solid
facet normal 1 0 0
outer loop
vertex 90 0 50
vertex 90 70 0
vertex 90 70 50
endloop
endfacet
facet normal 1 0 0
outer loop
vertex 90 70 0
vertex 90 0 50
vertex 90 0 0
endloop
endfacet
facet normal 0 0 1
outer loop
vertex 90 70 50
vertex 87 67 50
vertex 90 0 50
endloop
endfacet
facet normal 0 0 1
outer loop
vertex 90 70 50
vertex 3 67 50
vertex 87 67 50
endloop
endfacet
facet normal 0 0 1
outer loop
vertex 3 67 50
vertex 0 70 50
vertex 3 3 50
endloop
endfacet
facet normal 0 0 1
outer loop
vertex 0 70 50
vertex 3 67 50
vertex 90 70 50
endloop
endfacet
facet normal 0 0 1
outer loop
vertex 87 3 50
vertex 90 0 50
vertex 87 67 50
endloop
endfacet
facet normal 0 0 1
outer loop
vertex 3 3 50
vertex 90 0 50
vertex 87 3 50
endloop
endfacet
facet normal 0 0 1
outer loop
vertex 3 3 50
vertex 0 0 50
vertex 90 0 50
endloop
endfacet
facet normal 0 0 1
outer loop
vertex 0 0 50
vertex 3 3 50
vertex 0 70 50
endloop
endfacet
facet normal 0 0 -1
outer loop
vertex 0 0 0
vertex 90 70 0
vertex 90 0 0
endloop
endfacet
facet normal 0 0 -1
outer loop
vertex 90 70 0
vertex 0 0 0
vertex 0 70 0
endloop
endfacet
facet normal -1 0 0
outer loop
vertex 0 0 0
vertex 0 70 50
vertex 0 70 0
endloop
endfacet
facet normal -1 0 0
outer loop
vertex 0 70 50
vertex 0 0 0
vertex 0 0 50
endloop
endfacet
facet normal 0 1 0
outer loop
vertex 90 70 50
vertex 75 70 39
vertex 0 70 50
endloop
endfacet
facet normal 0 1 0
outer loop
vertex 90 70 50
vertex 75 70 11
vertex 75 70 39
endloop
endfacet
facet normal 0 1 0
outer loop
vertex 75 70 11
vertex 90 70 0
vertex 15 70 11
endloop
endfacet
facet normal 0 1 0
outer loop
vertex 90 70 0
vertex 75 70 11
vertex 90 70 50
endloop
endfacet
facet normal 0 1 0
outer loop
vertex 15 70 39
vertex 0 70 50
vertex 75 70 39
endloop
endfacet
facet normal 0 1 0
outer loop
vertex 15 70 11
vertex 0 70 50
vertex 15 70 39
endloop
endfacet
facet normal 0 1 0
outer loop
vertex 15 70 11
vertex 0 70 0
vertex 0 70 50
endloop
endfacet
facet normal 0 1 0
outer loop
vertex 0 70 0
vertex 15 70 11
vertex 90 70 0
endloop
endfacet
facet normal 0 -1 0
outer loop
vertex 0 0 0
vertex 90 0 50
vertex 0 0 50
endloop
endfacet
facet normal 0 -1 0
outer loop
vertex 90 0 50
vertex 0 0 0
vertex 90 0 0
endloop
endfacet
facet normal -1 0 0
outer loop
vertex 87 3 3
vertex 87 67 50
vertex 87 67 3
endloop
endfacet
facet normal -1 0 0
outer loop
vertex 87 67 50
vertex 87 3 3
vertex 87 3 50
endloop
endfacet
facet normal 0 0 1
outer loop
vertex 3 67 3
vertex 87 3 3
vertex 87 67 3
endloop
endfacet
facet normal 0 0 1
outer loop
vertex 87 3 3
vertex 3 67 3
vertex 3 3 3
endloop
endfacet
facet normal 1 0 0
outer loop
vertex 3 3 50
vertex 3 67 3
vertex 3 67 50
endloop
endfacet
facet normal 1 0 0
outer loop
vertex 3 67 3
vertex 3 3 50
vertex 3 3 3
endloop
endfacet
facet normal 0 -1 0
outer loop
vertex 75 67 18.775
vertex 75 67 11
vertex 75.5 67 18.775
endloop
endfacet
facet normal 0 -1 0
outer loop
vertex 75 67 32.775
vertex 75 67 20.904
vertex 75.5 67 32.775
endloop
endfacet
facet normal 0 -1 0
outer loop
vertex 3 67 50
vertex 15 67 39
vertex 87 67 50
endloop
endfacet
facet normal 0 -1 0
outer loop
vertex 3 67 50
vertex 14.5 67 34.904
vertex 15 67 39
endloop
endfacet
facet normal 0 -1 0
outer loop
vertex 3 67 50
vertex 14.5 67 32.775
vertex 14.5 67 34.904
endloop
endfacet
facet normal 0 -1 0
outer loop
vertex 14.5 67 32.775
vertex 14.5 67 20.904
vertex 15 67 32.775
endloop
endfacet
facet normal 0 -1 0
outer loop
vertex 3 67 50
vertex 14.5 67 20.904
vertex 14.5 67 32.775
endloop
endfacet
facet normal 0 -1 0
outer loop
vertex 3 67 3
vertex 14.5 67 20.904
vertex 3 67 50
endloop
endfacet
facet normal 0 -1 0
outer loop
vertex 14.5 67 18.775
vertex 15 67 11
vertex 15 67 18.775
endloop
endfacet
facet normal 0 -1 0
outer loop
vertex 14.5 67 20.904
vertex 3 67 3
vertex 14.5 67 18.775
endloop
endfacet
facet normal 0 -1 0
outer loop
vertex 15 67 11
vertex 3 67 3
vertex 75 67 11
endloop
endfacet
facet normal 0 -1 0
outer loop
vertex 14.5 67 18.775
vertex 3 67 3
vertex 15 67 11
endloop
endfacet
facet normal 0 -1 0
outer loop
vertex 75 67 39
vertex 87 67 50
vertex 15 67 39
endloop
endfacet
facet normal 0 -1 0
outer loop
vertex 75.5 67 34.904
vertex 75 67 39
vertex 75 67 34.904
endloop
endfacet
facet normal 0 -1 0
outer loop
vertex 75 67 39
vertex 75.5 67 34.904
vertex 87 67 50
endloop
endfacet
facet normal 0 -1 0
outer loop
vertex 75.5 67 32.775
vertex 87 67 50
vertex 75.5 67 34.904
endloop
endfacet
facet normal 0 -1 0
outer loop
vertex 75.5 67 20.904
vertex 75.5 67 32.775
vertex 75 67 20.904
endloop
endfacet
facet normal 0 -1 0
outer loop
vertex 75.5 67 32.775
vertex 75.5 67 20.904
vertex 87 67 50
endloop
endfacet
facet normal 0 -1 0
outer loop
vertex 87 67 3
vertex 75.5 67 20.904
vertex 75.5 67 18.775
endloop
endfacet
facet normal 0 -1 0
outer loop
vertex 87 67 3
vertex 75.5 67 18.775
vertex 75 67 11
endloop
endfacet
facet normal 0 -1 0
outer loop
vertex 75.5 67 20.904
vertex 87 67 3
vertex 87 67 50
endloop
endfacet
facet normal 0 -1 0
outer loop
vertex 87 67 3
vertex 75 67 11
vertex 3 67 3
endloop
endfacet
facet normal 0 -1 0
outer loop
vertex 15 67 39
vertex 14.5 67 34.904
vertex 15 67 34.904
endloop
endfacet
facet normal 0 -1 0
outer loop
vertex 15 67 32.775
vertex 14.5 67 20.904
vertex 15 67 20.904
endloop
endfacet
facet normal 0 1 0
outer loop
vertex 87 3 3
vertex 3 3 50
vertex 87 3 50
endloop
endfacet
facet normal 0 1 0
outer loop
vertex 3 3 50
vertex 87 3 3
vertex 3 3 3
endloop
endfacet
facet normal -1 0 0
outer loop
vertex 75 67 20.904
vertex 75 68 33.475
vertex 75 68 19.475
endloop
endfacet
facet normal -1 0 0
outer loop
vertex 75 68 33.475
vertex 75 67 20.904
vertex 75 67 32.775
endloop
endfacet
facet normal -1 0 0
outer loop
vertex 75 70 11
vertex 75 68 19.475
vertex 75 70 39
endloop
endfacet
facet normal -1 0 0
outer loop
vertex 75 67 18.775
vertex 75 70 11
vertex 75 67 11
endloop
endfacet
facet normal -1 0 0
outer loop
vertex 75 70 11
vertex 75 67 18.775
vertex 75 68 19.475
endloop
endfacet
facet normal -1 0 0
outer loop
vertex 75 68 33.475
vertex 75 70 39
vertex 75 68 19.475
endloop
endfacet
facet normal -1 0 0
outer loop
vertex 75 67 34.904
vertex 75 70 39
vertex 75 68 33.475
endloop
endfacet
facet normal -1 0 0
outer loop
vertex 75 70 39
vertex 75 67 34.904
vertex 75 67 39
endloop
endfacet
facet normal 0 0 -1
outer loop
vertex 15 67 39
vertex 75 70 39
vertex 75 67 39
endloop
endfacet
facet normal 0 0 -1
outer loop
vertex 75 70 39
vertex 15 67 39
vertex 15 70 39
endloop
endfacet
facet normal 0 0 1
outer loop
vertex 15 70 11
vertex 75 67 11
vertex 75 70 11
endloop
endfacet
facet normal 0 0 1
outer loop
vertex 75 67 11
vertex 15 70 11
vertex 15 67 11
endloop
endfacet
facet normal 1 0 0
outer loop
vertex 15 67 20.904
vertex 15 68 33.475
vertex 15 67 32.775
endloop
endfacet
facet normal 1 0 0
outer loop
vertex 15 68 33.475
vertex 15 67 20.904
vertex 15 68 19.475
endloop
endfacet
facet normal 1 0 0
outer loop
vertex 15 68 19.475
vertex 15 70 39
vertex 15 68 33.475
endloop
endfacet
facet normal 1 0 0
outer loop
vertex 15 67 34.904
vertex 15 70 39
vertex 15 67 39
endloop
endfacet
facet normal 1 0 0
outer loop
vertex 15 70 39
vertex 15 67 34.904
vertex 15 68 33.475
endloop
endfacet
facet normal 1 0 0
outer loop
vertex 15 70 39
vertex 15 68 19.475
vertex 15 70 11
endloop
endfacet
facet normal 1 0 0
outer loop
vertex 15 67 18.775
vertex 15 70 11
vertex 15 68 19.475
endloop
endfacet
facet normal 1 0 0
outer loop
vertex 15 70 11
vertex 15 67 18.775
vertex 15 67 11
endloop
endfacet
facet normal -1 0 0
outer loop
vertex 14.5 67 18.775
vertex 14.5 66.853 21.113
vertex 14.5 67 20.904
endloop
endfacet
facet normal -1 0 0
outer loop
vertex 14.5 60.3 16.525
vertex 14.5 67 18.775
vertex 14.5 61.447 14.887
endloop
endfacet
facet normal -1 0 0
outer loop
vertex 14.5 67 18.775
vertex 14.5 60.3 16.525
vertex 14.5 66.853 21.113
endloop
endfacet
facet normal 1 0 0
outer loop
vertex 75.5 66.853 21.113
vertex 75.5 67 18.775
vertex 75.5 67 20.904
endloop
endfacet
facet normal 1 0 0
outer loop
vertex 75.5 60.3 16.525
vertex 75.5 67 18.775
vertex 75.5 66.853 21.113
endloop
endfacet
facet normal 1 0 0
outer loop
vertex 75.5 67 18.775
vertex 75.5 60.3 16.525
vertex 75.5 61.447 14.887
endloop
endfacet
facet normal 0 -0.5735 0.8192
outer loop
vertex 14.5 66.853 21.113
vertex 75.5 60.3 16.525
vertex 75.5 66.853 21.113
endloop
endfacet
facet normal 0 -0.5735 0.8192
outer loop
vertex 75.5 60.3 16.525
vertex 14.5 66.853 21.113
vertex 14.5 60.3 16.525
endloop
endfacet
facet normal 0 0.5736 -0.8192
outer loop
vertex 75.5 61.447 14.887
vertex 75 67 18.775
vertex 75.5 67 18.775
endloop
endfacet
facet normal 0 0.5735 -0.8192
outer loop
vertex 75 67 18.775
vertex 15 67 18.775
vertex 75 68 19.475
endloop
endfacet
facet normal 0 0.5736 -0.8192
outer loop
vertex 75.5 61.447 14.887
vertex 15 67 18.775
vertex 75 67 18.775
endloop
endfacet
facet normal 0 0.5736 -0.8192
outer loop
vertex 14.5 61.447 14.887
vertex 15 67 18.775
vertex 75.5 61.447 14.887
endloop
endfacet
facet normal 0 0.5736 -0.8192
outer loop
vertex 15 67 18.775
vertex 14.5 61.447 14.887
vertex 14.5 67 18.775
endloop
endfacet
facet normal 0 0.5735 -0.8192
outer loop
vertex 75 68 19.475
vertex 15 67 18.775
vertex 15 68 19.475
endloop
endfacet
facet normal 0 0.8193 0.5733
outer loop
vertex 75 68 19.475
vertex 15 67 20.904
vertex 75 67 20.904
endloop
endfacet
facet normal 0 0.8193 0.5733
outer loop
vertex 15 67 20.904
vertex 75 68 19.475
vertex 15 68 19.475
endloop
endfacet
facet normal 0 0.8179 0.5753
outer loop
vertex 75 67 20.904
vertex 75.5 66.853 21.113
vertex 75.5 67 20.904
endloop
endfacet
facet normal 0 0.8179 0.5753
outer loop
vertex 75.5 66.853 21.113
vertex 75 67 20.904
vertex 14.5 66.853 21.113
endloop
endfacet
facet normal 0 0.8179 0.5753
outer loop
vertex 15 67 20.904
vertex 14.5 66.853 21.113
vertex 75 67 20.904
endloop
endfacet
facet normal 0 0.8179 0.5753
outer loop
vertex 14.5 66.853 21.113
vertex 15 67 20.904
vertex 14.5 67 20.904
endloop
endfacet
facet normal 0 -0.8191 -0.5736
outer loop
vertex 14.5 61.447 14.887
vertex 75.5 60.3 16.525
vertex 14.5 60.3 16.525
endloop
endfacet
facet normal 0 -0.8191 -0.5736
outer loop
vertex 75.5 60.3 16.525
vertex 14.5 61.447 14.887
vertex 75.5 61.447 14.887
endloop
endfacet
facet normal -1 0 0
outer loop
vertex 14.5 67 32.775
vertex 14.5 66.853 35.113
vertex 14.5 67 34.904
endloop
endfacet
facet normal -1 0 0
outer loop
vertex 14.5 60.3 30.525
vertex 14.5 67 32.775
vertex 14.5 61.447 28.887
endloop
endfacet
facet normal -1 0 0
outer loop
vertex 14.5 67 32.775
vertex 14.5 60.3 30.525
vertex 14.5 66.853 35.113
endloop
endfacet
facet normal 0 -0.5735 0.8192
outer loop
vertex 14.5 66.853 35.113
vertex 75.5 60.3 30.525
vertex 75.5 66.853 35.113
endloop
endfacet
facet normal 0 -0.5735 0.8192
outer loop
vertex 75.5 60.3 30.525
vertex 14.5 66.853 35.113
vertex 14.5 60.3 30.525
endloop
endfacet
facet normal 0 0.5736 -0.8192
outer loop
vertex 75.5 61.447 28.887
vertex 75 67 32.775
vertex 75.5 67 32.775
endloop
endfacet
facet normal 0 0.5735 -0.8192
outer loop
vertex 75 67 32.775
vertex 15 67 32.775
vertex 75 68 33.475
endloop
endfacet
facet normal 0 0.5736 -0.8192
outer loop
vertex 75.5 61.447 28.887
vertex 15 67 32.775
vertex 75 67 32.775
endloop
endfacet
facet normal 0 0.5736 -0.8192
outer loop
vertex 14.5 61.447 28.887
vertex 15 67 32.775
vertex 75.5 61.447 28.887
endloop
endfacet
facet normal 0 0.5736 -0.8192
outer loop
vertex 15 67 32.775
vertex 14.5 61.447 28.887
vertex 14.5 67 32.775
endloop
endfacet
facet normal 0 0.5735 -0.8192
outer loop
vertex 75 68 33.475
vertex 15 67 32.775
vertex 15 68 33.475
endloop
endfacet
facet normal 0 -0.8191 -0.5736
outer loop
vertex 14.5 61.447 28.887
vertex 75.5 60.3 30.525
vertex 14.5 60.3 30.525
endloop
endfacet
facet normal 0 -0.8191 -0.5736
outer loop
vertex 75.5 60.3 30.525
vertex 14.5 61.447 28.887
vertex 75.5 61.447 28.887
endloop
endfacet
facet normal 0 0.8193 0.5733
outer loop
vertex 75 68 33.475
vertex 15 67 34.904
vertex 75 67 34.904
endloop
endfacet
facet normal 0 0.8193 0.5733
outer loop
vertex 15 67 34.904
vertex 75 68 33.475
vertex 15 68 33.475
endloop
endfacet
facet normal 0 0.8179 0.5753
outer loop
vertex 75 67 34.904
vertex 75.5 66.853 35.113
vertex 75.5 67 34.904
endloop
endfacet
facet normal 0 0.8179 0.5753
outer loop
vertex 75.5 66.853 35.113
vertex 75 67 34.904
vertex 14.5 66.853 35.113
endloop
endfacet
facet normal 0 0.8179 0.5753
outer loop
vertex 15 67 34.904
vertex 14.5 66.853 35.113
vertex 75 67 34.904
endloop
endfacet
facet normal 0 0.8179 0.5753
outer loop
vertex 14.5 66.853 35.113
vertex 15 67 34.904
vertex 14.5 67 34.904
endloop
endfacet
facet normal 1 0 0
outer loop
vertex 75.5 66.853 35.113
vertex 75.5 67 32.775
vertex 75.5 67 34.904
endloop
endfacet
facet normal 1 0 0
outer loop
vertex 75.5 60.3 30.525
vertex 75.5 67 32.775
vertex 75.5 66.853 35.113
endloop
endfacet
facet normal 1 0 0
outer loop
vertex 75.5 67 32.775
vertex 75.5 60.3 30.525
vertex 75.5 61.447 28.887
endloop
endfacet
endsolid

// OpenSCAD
$fn = 32;

// ----------------------------------------------------------------------
// Vent box: louvers enclosure
// ----------------------------------------------------------------------

// --- parameters (mm) ---
box_l = 90;               // box length, X
box_w = 70;               // box width, Y
box_h = 50;               // box height, Z
wall_t = 3;               // shell wall thickness
win_l = 60;               // vent window width, X
win_h = 28;               // vent window height, Z
slat_t = 2;               // louver slat thickness
slat_d = 8;               // louver slat depth
slat_a = 35;              // louver slat angle, degrees
slat_pitch = 14;          // louver pitch
slat_yc = 64.15;          // slat centreline Y

win_z0 = (box_h - win_h) / 2;  // window lower edge Z
n_slats = 2;  // louver count
slat_z0 = win_z0 + (win_h - (n_slats - 1) * slat_pitch) / 2;

difference() {
  union() {
    difference() {
      cube([box_l, box_w, box_h]);
  translate([wall_t, wall_t, wall_t])
    cube([box_l - 2 * wall_t, box_w - 2 * wall_t, box_h]);
  translate([(box_l - win_l) / 2, box_w - wall_t - 1, win_z0])
    cube([win_l, wall_t + 2, win_h]);
    }
    for (i = [0 : n_slats - 1])
      translate([box_l / 2, slat_yc, slat_z0 + i * slat_pitch])
        rotate([slat_a, 0, 0])
          cube([win_l + 1, slat_d, slat_t], center = true);
  }
}
